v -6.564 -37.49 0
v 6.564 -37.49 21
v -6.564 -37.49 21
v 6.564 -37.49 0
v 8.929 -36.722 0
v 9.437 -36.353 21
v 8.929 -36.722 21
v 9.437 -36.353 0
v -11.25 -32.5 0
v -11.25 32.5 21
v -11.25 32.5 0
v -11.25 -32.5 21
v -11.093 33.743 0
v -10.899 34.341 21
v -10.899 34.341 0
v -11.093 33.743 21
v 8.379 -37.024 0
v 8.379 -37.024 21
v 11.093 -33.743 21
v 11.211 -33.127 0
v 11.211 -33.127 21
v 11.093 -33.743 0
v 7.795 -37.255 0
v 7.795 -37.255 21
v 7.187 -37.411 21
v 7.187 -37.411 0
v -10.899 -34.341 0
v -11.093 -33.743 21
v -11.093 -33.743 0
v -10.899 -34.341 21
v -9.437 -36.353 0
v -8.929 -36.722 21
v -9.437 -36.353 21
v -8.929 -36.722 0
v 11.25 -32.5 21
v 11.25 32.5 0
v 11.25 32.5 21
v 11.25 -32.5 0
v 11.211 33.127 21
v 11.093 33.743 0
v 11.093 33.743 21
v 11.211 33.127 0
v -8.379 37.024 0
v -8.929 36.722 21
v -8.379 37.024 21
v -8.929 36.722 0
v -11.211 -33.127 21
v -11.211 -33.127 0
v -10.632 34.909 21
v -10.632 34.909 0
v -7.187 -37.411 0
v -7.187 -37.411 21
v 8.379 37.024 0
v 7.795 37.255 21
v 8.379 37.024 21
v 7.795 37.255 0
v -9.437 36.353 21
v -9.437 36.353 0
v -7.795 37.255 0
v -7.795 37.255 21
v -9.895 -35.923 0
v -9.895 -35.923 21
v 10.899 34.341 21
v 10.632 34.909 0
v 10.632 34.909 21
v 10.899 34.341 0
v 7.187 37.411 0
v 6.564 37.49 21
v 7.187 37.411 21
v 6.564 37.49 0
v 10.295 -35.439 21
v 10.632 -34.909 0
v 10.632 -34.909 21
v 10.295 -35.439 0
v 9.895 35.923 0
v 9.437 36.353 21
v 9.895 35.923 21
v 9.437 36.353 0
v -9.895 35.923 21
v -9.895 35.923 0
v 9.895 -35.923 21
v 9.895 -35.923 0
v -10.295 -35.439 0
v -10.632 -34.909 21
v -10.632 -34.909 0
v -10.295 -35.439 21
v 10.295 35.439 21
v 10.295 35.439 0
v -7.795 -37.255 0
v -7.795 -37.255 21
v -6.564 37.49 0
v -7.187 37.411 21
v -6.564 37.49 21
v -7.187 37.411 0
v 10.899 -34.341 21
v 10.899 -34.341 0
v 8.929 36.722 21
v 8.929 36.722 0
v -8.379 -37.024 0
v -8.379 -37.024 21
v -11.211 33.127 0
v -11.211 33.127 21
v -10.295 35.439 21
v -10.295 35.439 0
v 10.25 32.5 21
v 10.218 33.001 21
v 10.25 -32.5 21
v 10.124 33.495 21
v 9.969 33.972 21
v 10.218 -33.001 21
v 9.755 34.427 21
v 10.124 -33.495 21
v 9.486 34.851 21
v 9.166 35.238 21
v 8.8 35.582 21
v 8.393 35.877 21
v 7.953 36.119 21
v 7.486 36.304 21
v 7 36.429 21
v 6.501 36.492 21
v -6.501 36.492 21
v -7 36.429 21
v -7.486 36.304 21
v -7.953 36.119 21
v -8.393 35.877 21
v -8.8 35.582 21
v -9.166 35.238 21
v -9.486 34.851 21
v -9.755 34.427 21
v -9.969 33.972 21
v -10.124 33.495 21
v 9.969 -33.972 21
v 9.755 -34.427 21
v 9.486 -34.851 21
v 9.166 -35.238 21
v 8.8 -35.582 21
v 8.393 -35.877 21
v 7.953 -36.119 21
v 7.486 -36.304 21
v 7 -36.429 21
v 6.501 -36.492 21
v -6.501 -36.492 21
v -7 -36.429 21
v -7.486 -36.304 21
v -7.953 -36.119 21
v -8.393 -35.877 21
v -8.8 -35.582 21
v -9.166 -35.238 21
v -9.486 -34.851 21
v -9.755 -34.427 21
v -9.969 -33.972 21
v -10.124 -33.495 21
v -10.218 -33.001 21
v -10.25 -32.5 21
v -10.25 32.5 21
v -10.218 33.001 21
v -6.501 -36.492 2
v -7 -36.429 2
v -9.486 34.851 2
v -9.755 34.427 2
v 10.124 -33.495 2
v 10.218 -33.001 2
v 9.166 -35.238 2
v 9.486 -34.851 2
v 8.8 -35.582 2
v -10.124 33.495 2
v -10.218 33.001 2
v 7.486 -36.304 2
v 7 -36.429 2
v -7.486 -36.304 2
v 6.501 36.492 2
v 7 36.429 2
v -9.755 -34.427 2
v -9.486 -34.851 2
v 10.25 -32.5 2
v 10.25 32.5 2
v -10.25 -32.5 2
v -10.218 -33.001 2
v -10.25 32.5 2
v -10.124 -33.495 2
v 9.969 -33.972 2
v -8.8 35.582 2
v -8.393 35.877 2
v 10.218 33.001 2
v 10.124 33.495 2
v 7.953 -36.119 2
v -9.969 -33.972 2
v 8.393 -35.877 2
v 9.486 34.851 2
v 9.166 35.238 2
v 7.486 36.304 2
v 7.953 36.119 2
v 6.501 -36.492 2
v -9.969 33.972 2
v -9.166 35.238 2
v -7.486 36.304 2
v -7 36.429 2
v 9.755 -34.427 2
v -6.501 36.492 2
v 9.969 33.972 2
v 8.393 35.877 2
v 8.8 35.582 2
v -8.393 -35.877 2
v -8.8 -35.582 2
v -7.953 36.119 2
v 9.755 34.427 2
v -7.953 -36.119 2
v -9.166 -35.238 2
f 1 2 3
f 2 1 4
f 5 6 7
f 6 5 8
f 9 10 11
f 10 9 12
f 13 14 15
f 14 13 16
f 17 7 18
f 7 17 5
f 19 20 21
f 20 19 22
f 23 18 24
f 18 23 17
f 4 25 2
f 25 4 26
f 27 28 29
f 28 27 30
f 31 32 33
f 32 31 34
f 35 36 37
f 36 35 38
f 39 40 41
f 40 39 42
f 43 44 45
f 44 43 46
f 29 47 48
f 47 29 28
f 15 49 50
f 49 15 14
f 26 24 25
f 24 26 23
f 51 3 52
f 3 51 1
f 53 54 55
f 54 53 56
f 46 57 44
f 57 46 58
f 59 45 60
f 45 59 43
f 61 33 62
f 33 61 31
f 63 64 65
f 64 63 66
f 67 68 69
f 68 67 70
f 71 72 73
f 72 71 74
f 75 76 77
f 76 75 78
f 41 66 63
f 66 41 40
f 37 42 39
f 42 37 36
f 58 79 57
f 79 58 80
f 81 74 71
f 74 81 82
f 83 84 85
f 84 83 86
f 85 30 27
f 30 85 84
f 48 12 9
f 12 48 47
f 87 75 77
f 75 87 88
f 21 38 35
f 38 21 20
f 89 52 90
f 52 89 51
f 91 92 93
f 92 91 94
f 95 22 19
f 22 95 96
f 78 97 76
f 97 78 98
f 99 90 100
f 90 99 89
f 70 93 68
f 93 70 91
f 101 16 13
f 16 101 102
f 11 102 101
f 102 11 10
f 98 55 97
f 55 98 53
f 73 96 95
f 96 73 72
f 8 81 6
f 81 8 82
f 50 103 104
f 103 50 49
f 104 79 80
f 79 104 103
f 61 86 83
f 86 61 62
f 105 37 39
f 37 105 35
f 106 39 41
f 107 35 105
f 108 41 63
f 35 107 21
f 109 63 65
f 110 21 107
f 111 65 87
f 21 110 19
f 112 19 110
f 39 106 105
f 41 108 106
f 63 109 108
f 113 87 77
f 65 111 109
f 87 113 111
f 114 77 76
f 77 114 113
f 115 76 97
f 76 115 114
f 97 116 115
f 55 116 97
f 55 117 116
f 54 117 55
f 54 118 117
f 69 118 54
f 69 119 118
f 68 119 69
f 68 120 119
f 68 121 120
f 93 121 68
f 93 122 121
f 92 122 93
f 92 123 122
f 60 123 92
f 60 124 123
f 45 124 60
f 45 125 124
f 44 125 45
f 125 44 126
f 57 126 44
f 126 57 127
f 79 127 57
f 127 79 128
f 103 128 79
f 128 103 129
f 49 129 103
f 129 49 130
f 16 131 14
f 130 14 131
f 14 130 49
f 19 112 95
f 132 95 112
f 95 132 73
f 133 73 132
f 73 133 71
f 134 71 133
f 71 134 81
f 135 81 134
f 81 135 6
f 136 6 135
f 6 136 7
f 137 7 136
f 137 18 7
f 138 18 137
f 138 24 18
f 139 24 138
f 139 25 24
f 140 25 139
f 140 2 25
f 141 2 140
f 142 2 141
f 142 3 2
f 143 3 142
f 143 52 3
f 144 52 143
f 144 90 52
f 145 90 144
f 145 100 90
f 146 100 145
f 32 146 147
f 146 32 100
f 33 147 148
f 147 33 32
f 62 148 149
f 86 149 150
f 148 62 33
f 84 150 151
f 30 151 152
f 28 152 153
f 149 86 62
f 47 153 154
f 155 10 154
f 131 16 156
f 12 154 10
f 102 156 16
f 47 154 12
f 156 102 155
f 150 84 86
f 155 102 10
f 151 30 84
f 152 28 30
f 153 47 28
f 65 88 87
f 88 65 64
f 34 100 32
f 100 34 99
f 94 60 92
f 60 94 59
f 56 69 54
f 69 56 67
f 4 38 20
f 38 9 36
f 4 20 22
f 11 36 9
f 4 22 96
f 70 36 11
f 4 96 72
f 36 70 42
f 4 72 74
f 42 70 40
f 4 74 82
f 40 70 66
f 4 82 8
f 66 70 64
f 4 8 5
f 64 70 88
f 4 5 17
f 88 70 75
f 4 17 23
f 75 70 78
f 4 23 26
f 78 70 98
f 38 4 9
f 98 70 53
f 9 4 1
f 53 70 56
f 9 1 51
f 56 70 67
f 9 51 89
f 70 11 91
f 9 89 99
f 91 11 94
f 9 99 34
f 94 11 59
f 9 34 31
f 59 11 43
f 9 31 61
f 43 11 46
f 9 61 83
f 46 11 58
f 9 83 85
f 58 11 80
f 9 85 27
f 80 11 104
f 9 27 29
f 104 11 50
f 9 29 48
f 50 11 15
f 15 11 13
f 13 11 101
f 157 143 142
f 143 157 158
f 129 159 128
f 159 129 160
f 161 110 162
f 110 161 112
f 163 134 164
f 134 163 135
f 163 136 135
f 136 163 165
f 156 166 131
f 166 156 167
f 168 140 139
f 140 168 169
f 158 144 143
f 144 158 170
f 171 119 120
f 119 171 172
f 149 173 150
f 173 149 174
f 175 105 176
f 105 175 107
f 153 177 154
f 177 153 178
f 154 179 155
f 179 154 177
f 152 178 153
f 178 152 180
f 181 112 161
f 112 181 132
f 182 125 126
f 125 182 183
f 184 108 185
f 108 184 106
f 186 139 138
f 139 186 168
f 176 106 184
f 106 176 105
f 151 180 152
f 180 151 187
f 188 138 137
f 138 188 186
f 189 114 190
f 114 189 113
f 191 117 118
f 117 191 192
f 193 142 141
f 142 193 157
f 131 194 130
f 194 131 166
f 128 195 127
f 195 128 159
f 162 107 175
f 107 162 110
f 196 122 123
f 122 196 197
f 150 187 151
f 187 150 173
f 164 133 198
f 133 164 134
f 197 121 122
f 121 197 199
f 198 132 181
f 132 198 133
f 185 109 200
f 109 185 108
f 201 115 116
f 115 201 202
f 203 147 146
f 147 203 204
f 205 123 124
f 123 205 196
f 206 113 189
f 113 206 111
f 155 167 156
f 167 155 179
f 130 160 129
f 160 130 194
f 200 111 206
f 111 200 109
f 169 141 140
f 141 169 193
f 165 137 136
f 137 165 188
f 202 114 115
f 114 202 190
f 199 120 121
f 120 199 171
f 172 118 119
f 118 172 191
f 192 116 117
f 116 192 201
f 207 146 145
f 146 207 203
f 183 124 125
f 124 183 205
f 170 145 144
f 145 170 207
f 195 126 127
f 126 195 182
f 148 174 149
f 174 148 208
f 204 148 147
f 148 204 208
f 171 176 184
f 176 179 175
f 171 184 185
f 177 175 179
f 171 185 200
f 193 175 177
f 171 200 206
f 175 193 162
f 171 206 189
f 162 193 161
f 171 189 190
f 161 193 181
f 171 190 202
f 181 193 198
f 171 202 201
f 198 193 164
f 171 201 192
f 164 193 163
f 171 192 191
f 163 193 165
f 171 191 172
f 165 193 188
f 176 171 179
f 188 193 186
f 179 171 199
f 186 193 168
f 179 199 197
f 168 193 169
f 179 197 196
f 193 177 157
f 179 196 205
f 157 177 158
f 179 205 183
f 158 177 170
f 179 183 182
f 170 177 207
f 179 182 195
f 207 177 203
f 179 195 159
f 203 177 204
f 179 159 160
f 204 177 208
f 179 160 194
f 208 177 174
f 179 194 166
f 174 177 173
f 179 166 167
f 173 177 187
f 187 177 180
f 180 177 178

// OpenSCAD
$fn = 50;


difference() {
	union() {
		hull() {
			translate(v = [-6.2500000000, 32.5000000000, 0]) {
				cylinder(h = 21, r = 5);
			}
			translate(v = [6.2500000000, 32.5000000000, 0]) {
				cylinder(h = 21, r = 5);
			}
			translate(v = [-6.2500000000, -32.5000000000, 0]) {
				cylinder(h = 21, r = 5);
			}
			translate(v = [6.2500000000, -32.5000000000, 0]) {
				cylinder(h = 21, r = 5);
			}
		}
	}
	union() {
		translate(v = [0, 0, 2]) {
			hull() {
				translate(v = [-6.2500000000, 32.5000000000, 0]) {
					cylinder(h = 19, r = 4);
				}
				translate(v = [6.2500000000, 32.5000000000, 0]) {
					cylinder(h = 19, r = 4);
				}
				translate(v = [-6.2500000000, -32.5000000000, 0]) {
					cylinder(h = 19, r = 4);
				}
				translate(v = [6.2500000000, -32.5000000000, 0]) {
					cylinder(h = 19, r = 4);
				}
			}
		}
	}
}
